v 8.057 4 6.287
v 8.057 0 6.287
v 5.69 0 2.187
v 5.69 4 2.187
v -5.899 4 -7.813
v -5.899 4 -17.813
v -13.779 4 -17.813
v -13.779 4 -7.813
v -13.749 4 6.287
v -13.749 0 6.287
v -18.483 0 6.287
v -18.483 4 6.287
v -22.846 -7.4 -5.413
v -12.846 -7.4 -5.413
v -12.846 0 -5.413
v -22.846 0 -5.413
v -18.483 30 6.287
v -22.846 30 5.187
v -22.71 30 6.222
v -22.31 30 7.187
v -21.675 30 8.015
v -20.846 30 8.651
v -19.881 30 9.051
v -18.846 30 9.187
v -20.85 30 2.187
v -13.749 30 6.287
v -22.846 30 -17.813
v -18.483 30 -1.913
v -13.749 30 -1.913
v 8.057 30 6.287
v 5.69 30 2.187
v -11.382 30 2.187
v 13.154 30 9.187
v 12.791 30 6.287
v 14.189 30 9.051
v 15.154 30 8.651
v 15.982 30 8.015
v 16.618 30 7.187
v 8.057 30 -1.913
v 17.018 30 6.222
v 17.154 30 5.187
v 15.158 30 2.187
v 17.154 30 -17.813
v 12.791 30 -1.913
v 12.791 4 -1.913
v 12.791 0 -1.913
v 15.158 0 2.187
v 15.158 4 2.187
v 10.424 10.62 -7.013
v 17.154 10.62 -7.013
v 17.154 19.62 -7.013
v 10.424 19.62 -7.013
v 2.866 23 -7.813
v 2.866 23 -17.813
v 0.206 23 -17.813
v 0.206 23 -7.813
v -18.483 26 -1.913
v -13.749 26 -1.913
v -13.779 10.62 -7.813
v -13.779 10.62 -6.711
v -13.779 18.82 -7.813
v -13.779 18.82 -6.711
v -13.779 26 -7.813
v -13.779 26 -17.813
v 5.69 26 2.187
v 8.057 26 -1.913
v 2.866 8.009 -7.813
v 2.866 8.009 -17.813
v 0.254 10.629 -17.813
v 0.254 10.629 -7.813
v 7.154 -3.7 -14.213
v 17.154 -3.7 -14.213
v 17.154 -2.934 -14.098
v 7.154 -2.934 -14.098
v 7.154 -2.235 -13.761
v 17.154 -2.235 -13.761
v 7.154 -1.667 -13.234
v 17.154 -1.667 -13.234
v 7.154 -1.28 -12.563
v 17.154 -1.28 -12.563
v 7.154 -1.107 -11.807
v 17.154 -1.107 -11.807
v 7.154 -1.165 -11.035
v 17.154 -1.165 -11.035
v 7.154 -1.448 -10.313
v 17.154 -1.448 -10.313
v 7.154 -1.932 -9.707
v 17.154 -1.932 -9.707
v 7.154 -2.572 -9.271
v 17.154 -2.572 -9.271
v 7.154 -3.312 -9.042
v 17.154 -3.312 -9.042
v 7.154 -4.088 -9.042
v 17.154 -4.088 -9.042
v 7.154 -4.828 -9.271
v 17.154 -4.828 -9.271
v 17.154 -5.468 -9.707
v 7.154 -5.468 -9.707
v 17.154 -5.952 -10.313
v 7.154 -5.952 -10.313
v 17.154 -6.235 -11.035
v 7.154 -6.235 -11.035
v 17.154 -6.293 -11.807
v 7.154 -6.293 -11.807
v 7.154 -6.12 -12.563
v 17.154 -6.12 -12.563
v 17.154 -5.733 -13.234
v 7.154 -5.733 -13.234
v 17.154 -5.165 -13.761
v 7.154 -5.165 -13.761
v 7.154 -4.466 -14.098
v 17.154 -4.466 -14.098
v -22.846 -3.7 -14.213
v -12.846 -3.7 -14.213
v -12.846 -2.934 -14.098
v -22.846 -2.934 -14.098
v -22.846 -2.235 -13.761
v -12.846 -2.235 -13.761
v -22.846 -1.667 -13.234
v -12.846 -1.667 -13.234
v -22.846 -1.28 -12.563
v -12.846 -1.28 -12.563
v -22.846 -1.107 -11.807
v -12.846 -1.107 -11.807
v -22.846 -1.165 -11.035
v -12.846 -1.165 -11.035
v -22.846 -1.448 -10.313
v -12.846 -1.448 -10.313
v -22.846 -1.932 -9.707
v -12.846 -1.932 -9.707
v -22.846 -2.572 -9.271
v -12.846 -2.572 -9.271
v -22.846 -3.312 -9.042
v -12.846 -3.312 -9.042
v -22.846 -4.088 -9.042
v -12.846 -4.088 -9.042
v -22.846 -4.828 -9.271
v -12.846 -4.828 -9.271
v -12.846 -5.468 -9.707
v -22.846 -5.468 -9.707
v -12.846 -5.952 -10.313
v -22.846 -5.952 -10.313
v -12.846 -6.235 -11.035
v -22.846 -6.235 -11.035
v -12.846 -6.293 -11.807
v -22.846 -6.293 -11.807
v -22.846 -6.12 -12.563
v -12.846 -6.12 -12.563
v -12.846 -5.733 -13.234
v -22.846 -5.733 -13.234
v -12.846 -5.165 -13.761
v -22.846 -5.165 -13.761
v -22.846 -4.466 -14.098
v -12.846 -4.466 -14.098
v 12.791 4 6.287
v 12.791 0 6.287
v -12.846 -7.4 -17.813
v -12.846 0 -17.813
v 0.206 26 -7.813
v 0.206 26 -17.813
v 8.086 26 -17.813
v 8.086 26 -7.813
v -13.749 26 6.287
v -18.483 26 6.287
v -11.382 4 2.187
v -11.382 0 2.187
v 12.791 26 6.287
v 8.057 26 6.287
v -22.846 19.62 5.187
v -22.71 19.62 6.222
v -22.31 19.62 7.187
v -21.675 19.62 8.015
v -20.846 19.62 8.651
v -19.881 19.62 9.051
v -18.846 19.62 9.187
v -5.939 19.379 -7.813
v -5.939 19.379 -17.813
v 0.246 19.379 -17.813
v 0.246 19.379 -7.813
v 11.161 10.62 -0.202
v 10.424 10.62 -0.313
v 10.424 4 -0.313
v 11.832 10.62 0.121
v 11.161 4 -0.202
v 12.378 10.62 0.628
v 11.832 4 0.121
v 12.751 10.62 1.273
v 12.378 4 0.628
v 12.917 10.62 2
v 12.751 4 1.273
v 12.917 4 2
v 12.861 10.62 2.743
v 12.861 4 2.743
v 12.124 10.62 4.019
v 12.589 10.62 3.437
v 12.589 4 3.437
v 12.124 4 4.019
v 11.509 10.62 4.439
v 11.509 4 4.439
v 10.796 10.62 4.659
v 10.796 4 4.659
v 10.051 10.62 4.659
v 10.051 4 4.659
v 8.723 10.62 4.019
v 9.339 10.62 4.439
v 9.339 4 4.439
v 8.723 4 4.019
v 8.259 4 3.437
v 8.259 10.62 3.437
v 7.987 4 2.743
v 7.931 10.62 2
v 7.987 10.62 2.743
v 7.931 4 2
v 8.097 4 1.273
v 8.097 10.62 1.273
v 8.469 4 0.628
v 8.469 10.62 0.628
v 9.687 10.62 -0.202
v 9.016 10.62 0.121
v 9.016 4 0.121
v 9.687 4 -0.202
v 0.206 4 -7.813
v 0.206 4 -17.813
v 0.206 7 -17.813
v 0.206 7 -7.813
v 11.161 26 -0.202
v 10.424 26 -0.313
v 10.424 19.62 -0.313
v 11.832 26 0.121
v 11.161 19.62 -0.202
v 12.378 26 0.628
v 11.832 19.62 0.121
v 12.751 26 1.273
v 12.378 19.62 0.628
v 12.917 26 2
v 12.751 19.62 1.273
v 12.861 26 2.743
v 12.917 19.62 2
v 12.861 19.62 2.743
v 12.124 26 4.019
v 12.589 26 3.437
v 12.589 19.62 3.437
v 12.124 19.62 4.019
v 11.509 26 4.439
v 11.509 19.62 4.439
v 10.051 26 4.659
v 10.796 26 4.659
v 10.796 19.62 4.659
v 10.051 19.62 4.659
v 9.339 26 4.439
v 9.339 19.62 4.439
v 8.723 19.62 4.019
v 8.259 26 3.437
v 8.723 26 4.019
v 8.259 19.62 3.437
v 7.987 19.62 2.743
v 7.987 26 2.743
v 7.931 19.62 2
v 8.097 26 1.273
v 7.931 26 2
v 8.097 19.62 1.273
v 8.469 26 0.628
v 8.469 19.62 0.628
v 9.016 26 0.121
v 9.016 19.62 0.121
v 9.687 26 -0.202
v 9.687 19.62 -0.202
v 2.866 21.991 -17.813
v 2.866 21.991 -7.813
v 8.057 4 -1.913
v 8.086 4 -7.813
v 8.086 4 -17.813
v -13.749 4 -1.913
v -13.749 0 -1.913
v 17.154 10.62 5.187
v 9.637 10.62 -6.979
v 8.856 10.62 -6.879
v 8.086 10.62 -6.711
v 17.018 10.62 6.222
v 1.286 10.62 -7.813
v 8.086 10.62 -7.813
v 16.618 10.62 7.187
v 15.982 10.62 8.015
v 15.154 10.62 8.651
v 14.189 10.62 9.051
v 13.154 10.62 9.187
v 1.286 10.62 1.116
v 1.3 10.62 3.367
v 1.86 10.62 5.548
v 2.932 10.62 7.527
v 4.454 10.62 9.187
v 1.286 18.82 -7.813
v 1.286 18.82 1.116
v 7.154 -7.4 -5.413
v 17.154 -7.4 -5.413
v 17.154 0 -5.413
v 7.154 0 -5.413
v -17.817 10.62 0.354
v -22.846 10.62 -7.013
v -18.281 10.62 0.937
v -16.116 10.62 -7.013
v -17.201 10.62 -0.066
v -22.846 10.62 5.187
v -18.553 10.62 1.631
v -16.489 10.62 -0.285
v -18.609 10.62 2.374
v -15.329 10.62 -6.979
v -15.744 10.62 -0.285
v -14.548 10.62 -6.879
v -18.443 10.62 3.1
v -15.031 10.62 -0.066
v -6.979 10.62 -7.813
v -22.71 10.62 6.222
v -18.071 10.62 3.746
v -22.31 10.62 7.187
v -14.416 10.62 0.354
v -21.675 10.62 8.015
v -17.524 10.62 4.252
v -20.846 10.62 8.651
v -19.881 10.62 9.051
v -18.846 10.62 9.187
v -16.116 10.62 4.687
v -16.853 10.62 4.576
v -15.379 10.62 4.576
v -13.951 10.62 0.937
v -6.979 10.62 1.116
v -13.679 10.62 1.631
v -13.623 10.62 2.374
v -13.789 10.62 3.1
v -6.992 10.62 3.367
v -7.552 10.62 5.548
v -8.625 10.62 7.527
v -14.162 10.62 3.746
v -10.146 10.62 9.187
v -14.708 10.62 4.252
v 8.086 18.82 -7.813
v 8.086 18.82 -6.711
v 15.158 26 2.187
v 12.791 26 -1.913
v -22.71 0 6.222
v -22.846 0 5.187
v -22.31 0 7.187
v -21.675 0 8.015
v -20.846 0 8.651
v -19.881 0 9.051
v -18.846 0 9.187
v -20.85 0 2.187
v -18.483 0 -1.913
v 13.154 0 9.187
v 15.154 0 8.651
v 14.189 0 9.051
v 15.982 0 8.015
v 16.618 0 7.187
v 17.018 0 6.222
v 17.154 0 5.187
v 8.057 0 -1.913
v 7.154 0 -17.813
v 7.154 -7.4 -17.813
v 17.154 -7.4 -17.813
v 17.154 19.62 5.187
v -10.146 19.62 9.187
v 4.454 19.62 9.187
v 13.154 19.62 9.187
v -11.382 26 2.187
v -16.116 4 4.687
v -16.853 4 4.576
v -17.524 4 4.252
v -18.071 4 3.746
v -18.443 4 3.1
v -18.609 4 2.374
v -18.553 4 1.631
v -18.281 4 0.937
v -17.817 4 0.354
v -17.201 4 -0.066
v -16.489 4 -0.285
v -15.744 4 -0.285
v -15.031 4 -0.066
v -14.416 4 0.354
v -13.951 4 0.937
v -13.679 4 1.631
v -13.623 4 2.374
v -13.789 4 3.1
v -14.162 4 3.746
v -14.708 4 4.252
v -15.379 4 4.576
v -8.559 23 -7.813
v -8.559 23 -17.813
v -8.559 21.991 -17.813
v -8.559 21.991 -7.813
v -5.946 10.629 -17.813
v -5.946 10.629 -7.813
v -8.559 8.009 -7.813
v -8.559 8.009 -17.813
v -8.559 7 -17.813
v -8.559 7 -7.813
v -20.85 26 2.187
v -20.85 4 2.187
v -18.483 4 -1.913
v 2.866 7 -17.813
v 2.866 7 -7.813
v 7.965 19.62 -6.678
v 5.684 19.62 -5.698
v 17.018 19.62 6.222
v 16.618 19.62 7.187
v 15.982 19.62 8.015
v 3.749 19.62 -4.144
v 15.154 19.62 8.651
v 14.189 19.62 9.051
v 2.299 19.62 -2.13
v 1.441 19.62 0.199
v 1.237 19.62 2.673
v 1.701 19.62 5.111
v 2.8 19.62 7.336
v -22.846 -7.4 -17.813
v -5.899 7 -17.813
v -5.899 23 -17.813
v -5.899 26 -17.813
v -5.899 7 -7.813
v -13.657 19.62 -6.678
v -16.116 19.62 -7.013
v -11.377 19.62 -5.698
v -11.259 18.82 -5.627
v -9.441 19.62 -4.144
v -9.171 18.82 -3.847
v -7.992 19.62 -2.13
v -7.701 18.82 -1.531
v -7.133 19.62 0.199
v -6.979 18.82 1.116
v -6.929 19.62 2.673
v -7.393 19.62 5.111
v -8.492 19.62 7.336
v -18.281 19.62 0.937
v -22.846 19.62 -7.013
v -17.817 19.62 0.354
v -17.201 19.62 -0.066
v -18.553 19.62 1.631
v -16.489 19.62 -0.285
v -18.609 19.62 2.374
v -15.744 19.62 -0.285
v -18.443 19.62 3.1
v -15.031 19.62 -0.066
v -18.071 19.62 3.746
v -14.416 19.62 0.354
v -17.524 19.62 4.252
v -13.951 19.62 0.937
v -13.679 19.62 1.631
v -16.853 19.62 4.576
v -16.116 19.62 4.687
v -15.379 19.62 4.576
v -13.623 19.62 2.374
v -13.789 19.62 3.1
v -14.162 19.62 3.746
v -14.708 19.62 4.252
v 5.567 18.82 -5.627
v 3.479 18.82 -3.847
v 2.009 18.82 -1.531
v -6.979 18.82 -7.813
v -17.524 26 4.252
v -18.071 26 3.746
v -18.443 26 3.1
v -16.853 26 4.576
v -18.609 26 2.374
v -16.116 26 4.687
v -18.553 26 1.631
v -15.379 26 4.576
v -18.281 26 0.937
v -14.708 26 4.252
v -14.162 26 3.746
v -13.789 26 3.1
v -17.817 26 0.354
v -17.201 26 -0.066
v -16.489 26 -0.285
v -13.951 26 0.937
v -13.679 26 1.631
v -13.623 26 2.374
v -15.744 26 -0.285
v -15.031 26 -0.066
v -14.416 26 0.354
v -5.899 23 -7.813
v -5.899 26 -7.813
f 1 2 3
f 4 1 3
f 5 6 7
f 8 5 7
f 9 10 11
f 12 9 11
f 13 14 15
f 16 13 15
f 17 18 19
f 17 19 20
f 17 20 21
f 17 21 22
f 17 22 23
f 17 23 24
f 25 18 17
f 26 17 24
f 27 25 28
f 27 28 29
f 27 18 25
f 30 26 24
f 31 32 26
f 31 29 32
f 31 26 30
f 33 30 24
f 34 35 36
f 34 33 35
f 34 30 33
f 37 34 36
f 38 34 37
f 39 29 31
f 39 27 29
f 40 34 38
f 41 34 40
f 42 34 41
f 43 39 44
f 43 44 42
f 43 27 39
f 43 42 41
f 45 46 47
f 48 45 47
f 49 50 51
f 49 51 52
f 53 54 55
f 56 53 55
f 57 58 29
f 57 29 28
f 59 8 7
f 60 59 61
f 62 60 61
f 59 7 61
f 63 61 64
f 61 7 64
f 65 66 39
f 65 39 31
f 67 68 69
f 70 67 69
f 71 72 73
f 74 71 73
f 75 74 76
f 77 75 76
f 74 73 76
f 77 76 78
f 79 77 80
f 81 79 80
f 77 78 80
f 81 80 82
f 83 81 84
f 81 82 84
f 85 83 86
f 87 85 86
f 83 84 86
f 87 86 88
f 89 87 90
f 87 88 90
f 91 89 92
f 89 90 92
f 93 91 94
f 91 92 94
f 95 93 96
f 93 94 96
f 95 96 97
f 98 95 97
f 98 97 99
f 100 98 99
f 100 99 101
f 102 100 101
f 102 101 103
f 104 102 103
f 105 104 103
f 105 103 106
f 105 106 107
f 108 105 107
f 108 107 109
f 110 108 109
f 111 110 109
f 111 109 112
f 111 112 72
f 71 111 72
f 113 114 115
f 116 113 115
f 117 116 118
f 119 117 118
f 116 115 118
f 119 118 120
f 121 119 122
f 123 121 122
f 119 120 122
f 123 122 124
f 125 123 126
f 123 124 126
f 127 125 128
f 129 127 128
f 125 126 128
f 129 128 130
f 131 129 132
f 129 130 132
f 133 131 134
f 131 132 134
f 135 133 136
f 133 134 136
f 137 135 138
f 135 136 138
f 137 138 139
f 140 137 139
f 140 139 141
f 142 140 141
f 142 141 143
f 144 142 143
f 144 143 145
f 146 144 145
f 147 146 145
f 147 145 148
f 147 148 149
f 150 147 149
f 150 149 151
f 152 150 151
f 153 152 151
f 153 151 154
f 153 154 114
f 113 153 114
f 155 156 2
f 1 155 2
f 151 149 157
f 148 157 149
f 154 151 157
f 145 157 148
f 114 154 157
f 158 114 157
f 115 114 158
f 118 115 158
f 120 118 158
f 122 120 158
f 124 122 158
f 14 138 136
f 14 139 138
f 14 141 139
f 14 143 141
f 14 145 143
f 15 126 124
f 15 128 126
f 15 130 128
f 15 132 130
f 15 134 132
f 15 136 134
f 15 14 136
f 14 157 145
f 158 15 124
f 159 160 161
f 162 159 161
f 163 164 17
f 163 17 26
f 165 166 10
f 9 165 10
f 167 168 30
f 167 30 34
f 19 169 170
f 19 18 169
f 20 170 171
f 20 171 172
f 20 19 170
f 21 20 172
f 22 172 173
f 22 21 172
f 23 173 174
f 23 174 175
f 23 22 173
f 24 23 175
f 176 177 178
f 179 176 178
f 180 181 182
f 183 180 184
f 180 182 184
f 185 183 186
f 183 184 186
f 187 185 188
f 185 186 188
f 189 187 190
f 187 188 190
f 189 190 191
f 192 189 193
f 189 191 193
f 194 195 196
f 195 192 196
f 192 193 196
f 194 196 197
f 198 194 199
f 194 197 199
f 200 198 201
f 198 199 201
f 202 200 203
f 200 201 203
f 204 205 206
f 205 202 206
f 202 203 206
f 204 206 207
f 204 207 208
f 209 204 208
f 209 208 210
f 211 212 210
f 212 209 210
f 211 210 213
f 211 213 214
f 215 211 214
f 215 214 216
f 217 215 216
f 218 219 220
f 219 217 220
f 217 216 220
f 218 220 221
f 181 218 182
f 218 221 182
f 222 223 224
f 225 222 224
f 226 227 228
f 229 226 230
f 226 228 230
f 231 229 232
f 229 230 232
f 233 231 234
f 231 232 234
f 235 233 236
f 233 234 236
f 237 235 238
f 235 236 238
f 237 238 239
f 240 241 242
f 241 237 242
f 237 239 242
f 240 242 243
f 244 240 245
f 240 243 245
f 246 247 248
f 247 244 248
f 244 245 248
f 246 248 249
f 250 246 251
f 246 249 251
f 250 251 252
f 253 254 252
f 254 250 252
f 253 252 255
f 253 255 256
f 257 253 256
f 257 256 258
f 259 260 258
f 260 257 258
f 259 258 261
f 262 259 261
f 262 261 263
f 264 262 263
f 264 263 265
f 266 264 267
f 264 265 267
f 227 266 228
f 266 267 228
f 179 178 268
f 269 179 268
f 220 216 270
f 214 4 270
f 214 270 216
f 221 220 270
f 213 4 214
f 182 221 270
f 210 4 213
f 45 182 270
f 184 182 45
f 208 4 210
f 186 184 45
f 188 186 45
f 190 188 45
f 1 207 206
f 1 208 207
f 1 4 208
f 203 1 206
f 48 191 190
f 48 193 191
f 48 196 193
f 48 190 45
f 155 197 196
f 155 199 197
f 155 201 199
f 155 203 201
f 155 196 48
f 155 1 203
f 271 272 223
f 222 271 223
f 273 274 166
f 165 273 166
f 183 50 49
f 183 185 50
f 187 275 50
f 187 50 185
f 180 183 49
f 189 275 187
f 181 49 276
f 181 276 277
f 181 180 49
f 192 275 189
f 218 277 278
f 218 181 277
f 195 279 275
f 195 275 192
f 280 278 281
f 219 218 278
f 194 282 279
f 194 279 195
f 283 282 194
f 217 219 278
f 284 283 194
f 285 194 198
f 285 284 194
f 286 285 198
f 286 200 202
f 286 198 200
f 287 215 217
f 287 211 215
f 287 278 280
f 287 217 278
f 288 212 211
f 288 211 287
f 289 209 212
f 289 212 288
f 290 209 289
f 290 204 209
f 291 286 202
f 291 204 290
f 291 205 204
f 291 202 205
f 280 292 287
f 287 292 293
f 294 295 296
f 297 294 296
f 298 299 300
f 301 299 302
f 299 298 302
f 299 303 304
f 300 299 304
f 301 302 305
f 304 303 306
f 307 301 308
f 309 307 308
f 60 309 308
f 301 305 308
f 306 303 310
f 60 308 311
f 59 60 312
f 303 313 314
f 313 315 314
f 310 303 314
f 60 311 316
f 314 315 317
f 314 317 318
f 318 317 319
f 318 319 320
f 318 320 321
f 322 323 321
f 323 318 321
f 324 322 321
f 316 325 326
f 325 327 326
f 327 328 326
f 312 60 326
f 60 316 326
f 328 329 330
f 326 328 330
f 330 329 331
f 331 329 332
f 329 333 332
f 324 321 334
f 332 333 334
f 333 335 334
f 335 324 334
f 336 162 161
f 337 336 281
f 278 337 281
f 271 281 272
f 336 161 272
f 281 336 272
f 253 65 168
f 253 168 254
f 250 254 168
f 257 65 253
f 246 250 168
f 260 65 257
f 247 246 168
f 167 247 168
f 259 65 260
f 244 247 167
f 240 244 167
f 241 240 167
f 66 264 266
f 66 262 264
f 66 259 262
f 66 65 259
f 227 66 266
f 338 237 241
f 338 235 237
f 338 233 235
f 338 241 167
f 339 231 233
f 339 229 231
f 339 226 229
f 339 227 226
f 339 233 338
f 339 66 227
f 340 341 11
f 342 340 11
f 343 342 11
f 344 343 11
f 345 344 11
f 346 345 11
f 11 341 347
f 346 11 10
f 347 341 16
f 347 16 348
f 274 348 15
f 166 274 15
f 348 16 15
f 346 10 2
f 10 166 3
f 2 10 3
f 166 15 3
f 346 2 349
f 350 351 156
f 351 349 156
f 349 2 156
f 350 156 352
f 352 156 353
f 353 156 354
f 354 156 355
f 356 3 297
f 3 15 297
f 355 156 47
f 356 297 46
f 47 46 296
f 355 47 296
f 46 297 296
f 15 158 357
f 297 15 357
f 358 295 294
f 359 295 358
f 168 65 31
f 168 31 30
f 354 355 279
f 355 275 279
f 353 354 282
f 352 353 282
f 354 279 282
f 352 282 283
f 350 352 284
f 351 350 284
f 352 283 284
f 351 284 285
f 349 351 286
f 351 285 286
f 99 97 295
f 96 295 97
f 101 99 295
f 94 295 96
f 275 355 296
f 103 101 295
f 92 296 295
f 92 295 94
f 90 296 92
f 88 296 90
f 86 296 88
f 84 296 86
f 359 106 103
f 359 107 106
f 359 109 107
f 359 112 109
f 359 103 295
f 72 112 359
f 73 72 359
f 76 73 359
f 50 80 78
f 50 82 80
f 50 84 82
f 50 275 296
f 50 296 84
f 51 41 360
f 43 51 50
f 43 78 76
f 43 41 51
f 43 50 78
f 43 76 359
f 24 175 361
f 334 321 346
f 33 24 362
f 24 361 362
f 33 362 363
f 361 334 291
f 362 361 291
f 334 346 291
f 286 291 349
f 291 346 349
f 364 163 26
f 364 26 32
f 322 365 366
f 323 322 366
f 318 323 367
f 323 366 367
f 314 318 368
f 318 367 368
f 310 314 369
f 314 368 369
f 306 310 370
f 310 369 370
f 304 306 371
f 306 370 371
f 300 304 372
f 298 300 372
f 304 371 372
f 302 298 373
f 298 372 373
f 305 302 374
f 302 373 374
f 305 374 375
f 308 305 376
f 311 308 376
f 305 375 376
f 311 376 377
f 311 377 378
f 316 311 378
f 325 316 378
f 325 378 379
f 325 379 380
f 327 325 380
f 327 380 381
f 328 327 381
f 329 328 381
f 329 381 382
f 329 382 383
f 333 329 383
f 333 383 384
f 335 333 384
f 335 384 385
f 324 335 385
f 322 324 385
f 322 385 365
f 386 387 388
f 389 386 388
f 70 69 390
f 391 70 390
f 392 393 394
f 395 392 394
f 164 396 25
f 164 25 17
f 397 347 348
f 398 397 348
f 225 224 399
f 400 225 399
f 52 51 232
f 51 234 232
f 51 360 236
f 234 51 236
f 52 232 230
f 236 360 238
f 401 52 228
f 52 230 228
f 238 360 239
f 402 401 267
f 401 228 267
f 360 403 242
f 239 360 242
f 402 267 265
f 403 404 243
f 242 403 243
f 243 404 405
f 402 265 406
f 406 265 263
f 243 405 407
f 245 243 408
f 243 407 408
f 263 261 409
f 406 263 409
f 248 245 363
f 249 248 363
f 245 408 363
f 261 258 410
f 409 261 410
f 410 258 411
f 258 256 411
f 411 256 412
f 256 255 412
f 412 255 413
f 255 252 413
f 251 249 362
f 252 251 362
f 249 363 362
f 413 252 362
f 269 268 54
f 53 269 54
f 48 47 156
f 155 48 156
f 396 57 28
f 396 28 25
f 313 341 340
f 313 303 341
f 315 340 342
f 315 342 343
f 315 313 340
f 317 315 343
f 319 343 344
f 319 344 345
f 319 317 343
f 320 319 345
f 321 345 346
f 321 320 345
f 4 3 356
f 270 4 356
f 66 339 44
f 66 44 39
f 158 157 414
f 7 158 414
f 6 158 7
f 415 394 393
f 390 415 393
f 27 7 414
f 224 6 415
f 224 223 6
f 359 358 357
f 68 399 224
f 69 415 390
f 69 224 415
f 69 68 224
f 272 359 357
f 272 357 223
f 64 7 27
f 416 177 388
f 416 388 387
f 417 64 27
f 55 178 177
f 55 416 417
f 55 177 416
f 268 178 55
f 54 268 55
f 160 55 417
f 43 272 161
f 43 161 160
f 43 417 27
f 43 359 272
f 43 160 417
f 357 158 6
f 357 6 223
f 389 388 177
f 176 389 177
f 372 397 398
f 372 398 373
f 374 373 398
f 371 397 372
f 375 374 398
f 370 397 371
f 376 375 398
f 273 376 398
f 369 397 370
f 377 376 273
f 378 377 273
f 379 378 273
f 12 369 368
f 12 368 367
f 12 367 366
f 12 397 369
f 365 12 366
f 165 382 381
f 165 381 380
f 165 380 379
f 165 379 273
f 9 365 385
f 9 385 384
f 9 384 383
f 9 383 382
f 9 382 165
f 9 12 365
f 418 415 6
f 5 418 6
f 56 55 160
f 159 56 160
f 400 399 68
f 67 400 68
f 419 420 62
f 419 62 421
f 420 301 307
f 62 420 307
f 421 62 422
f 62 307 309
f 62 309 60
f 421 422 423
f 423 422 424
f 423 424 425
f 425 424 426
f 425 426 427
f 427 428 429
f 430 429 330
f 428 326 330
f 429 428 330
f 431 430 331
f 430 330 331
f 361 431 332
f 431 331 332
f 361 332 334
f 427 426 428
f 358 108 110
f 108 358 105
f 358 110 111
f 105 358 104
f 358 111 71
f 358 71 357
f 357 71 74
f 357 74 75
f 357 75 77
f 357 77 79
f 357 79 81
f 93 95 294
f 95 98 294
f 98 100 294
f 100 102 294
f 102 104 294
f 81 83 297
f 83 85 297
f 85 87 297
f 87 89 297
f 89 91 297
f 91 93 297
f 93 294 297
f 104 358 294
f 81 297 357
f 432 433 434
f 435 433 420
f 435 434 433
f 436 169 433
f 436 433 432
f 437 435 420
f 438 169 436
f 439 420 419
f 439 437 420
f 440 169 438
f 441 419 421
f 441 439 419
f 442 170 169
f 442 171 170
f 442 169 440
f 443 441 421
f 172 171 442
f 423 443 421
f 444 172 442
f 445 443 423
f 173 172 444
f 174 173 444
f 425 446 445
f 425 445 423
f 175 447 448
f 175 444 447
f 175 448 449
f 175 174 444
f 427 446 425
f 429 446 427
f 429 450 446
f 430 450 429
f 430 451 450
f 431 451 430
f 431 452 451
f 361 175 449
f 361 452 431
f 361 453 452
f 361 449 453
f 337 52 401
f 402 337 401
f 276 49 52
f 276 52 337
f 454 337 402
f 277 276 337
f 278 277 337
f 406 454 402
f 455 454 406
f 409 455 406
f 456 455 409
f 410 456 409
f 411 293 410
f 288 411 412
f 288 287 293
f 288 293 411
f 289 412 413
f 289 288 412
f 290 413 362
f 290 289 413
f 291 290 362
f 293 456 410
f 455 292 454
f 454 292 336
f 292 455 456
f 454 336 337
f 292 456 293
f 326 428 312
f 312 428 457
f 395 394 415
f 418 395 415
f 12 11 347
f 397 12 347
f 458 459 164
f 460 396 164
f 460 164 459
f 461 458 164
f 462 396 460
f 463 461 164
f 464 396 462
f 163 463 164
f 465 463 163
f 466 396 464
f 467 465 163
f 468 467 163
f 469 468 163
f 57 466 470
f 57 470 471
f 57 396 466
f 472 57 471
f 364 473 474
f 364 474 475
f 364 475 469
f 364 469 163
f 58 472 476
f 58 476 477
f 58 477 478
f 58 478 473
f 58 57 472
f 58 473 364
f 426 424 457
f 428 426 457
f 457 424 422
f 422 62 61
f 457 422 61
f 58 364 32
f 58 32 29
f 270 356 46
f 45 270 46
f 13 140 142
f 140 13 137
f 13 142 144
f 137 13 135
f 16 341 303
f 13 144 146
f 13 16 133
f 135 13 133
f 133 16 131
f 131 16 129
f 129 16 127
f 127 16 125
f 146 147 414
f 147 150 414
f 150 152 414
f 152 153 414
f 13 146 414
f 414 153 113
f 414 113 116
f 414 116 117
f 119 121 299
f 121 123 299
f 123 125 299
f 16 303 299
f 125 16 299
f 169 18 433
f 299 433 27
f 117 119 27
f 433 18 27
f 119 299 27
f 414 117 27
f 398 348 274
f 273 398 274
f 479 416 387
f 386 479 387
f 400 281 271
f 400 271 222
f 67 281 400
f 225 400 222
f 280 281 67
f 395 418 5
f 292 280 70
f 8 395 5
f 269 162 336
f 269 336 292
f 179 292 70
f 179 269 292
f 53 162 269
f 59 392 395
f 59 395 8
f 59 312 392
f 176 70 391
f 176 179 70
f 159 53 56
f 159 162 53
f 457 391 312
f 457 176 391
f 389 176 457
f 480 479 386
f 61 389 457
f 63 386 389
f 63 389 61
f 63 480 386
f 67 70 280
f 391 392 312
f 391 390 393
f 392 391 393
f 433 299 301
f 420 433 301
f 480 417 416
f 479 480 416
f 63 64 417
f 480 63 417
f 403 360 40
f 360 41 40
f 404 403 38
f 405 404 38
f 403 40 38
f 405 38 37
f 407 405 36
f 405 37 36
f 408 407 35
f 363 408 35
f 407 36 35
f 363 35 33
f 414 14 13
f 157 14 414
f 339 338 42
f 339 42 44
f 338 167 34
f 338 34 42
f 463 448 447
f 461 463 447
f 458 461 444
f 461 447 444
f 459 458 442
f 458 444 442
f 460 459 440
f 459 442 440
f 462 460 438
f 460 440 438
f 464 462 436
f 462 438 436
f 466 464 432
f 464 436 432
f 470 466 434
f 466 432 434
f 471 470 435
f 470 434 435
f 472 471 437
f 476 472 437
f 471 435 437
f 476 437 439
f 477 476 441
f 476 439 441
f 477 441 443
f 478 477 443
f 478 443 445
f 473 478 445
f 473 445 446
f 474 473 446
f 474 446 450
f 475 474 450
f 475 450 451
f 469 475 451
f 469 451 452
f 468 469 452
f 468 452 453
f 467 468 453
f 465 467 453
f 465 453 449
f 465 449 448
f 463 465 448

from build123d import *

# Parameters (mm, degrees)
SKETCH1_W           = 40
SKETCH1_H           = 27
BOSS_EXTRUDE1_DEPTH = 30
CUT_EXTRUDE1_DEPTH  = 10
SKETCH3_R           = 2.5
CUT_EXTRUDE2_DEPTH  = 30
CUT_EXTRUDE5_START  = -10.62
CUT_EXTRUDE5_DEPTH  = 9
SKETCH10_W          = 20
SKETCH10_H          = 8.2
CUT_EXTRUDE7_DEPTH  = 6.8
SKETCH12_W          = 20
SKETCH12_H          = 8.2
CUT_EXTRUDE10_DEPTH = 6.8
FILLET1_R           = 4
SKETCH13_W          = 12.4
SKETCH13_H          = 7.4
SKETCH13_R          = 2.6
BOSS_EXTRUDE2_DEPTH = 40
CUT_EXTRUDE11_REACH = 42.436
SKETCH14_W          = 20
SKETCH14_H          = 7.4
CUT_EXTRUDE12_START = -4
SKETCH15_R          = 2.5
CUT_EXTRUDE12_DEPTH = 4
SKETCH16_R          = 2.5
CUT_EXTRUDE13_DEPTH = 4


with BuildPart() as part:
    # Sketch1 → Boss-Extrude1 (new body)
    with BuildSketch(Plane(origin=(0, 0, 0), x_dir=(1, 0, 0), z_dir=(0, 1, 0))):
        with Locations((-2.846153846, 4.313186813)):
            Rectangle(SKETCH1_W, SKETCH1_H)
    extrude(amount=BOSS_EXTRUDE1_DEPTH)

    # Sketch2 → Cut-Extrude1 (cut)
    with BuildSketch(Plane(origin=(0, 0, -17.813186813), x_dir=(-1, 0, 0), z_dir=(0, 0, -1))):
        Polygon((-8.086431081, 26), (-8.086431081, 4), (-0.206431081, 4), (-0.206431081, 7), (-2.866431081, 7), (-2.866431081, 8.008707537), (-0.253846154, 10.628707537), (5.946153846, 10.628707537), (8.558738773, 8.008707537), (8.558738773, 7), (5.898738773, 7), (5.898738773, 4), (13.778738773, 4), (13.778738773, 26), (5.898738773, 26), (5.898738773, 23), (8.558738773, 23), (8.558738773, 21.991292463), (5.938738773, 19.378707537), (-0.246431081, 19.378707537), (-2.866431081, 21.991292463), (-2.866431081, 23), (-0.206431081, 23), (-0.206431081, 26), align=None)
    extrude(amount=-CUT_EXTRUDE1_DEPTH, mode=Mode.SUBTRACT)

    # Sketch3 → Cut-Extrude2 (cut)
    with BuildSketch(Plane.XZ):
        with Locations(Location((10.423846154, 2.186813187, 0), (0, 0, 270))):
            Circle(SKETCH3_R)
        with Locations(Location((-16.116153846, 2.186813187, 0), (0, 0, 90))):
            Circle(SKETCH3_R)
    extrude(amount=-CUT_EXTRUDE2_DEPTH, mode=Mode.SUBTRACT)

    # Sketch8 → Cut-Extrude5 (cut)
    with BuildSketch(Plane.XZ.offset(CUT_EXTRUDE5_START)):
        with BuildLine():
            Line((4.453921531, 9.186813187), (17.153846154, 9.186813187))
            Line((17.153846154, 9.186813187), (17.153846154, -7.013186813))
            Line((17.153846154, -7.013186813), (10.423846154, -7.013186813))
            ThreePointArc((10.423846154, -7.013186813), (1.791349412, -0.994381557), (4.453921531, 9.186813187))
        make_face()
        with BuildLine():
            Line((-22.846153846, -7.013186813), (-16.116153846, -7.013186813))
            ThreePointArc((-16.116153846, -7.013186813), (-7.483657104, -0.994381557), (-10.146229224, 9.186813187))
            Line((-10.146229224, 9.186813187), (-22.846153846, 9.186813187))
            Line((-22.846153846, 9.186813187), (-22.846153846, -7.013186813))
        make_face()
    extrude(amount=-CUT_EXTRUDE5_DEPTH, mode=Mode.SUBTRACT)

    # Sketch10 → Cut-Extrude7 (cut)
    with BuildSketch(Plane.ZY.offset(-8.086431081)):
        with Locations((-7.813186813, 14.72)):
            Rectangle(SKETCH10_W, SKETCH10_H)
    extrude(amount=CUT_EXTRUDE7_DEPTH, mode=Mode.SUBTRACT)

    # Sketch12 → Cut-Extrude10 (cut)
    with BuildSketch(Plane(origin=(-13.778738773, 0, 0), x_dir=(0, 0, -1), z_dir=(1, 0, 0))):
        with Locations((7.813186813, 14.72)):
            Rectangle(SKETCH12_W, SKETCH12_H)
    extrude(amount=CUT_EXTRUDE10_DEPTH, mode=Mode.SUBTRACT)

    # Fillet1
    fillet1_edges = [part.edges().sort_by_distance(p)[0] for p in [
        (17.153846154, 24.81, 9.186813187),
        (-22.846153846, 24.81, 9.186813187),
        (17.153846154, 5.31, 9.186813187),
        (-22.846153846, 5.31, 9.186813187),
    ]]
    fillet(fillet1_edges, radius=FILLET1_R)

    # Sketch13 → Boss-Extrude2 (add)
    with BuildSketch(Plane(origin=(17.153846154, 0, 0), x_dir=(0, 0, -1), z_dir=(1, 0, 0))):
        with Locations((11.613186813, -3.7)):
            Rectangle(SKETCH13_W, SKETCH13_H)
        with Locations((11.613186813, -3.7)):
            Circle(SKETCH13_R, mode=Mode.SUBTRACT)
    extrude(amount=-BOSS_EXTRUDE2_DEPTH)

    # Sketch14 → Cut-Extrude11 (cut, up to next)
    with BuildSketch(Plane.XY.offset(-5.413186813), mode=Mode.PRIVATE) as cut_extrude11_sk1:
        with Locations((-2.846153846, -3.7)):
            Rectangle(SKETCH14_W, SKETCH14_H)
    cut_extrude11_tool1 = extrude(cut_extrude11_sk1.sketch, amount=-CUT_EXTRUDE11_REACH, mode=Mode.PRIVATE) & part.part
    add(cut_extrude11_tool1.solids().sort_by_distance((-2.846154, -3.7, -5.413187))[0], mode=Mode.SUBTRACT)

    # Sketch15 → Cut-Extrude12 (cut)
    # profile 1 of 2: a face of its own
    with BuildSketch(Plane(origin=(0, 30, 0), x_dir=(1, 0, 0), z_dir=(0, 1, 0)).offset(CUT_EXTRUDE12_START)):
        Polygon((12.790982258, -6.286813187), (15.158118361, -2.186813187), (12.790982258, 1.913186813), (8.05671005, 1.913186813), (5.689573946, -2.186813187), (8.05671005, -6.286813187), align=None)
        with Locations(Location((10.423846154, -2.186813187, 0), (0, 0, 90))):
            Circle(SKETCH15_R, mode=Mode.SUBTRACT)
    # profile 2 of 2: a face of its own
    with BuildSketch(Plane(origin=(0, 30, 0), x_dir=(1, 0, 0), z_dir=(0, 1, 0)).offset(CUT_EXTRUDE12_START)):
        Polygon((-13.749017742, -6.286813187), (-11.381881639, -2.186813187), (-13.749017742, 1.913186813), (-18.48328995, 1.913186813), (-20.850426054, -2.186813187), (-18.48328995, -6.286813187), align=None)
        with Locations(Location((-16.116153846, -2.186813187, 0), (0, 0, 90))):
            Circle(SKETCH15_R, mode=Mode.SUBTRACT)
    extrude(amount=CUT_EXTRUDE12_DEPTH, mode=Mode.SUBTRACT)

    # Sketch16 → Cut-Extrude13 (cut)
    # profile 1 of 2: a face of its own
    with BuildSketch(Plane.XZ):
        Polygon((-13.749017742, -1.913186813), (-11.381881639, 2.186813187), (-13.749017742, 6.286813187), (-18.48328995, 6.286813187), (-20.850426054, 2.186813187), (-18.48328995, -1.913186813), align=None)
        with Locations(Location((-16.116153846, 2.186813187, 0), (0, 0, 270))):
            Circle(SKETCH16_R, mode=Mode.SUBTRACT)
    # profile 2 of 2: a face of its own
    with BuildSketch(Plane.XZ):
        Polygon((12.790982258, -1.913186813), (15.158118361, 2.186813187), (12.790982258, 6.286813187), (8.05671005, 6.286813187), (5.689573946, 2.186813187), (8.05671005, -1.913186813), align=None)
        with Locations(Location((10.423846154, 2.186813187, 0), (0, 0, 270))):
            Circle(SKETCH16_R, mode=Mode.SUBTRACT)
    extrude(amount=-CUT_EXTRUDE13_DEPTH, mode=Mode.SUBTRACT)


solid = part.part
